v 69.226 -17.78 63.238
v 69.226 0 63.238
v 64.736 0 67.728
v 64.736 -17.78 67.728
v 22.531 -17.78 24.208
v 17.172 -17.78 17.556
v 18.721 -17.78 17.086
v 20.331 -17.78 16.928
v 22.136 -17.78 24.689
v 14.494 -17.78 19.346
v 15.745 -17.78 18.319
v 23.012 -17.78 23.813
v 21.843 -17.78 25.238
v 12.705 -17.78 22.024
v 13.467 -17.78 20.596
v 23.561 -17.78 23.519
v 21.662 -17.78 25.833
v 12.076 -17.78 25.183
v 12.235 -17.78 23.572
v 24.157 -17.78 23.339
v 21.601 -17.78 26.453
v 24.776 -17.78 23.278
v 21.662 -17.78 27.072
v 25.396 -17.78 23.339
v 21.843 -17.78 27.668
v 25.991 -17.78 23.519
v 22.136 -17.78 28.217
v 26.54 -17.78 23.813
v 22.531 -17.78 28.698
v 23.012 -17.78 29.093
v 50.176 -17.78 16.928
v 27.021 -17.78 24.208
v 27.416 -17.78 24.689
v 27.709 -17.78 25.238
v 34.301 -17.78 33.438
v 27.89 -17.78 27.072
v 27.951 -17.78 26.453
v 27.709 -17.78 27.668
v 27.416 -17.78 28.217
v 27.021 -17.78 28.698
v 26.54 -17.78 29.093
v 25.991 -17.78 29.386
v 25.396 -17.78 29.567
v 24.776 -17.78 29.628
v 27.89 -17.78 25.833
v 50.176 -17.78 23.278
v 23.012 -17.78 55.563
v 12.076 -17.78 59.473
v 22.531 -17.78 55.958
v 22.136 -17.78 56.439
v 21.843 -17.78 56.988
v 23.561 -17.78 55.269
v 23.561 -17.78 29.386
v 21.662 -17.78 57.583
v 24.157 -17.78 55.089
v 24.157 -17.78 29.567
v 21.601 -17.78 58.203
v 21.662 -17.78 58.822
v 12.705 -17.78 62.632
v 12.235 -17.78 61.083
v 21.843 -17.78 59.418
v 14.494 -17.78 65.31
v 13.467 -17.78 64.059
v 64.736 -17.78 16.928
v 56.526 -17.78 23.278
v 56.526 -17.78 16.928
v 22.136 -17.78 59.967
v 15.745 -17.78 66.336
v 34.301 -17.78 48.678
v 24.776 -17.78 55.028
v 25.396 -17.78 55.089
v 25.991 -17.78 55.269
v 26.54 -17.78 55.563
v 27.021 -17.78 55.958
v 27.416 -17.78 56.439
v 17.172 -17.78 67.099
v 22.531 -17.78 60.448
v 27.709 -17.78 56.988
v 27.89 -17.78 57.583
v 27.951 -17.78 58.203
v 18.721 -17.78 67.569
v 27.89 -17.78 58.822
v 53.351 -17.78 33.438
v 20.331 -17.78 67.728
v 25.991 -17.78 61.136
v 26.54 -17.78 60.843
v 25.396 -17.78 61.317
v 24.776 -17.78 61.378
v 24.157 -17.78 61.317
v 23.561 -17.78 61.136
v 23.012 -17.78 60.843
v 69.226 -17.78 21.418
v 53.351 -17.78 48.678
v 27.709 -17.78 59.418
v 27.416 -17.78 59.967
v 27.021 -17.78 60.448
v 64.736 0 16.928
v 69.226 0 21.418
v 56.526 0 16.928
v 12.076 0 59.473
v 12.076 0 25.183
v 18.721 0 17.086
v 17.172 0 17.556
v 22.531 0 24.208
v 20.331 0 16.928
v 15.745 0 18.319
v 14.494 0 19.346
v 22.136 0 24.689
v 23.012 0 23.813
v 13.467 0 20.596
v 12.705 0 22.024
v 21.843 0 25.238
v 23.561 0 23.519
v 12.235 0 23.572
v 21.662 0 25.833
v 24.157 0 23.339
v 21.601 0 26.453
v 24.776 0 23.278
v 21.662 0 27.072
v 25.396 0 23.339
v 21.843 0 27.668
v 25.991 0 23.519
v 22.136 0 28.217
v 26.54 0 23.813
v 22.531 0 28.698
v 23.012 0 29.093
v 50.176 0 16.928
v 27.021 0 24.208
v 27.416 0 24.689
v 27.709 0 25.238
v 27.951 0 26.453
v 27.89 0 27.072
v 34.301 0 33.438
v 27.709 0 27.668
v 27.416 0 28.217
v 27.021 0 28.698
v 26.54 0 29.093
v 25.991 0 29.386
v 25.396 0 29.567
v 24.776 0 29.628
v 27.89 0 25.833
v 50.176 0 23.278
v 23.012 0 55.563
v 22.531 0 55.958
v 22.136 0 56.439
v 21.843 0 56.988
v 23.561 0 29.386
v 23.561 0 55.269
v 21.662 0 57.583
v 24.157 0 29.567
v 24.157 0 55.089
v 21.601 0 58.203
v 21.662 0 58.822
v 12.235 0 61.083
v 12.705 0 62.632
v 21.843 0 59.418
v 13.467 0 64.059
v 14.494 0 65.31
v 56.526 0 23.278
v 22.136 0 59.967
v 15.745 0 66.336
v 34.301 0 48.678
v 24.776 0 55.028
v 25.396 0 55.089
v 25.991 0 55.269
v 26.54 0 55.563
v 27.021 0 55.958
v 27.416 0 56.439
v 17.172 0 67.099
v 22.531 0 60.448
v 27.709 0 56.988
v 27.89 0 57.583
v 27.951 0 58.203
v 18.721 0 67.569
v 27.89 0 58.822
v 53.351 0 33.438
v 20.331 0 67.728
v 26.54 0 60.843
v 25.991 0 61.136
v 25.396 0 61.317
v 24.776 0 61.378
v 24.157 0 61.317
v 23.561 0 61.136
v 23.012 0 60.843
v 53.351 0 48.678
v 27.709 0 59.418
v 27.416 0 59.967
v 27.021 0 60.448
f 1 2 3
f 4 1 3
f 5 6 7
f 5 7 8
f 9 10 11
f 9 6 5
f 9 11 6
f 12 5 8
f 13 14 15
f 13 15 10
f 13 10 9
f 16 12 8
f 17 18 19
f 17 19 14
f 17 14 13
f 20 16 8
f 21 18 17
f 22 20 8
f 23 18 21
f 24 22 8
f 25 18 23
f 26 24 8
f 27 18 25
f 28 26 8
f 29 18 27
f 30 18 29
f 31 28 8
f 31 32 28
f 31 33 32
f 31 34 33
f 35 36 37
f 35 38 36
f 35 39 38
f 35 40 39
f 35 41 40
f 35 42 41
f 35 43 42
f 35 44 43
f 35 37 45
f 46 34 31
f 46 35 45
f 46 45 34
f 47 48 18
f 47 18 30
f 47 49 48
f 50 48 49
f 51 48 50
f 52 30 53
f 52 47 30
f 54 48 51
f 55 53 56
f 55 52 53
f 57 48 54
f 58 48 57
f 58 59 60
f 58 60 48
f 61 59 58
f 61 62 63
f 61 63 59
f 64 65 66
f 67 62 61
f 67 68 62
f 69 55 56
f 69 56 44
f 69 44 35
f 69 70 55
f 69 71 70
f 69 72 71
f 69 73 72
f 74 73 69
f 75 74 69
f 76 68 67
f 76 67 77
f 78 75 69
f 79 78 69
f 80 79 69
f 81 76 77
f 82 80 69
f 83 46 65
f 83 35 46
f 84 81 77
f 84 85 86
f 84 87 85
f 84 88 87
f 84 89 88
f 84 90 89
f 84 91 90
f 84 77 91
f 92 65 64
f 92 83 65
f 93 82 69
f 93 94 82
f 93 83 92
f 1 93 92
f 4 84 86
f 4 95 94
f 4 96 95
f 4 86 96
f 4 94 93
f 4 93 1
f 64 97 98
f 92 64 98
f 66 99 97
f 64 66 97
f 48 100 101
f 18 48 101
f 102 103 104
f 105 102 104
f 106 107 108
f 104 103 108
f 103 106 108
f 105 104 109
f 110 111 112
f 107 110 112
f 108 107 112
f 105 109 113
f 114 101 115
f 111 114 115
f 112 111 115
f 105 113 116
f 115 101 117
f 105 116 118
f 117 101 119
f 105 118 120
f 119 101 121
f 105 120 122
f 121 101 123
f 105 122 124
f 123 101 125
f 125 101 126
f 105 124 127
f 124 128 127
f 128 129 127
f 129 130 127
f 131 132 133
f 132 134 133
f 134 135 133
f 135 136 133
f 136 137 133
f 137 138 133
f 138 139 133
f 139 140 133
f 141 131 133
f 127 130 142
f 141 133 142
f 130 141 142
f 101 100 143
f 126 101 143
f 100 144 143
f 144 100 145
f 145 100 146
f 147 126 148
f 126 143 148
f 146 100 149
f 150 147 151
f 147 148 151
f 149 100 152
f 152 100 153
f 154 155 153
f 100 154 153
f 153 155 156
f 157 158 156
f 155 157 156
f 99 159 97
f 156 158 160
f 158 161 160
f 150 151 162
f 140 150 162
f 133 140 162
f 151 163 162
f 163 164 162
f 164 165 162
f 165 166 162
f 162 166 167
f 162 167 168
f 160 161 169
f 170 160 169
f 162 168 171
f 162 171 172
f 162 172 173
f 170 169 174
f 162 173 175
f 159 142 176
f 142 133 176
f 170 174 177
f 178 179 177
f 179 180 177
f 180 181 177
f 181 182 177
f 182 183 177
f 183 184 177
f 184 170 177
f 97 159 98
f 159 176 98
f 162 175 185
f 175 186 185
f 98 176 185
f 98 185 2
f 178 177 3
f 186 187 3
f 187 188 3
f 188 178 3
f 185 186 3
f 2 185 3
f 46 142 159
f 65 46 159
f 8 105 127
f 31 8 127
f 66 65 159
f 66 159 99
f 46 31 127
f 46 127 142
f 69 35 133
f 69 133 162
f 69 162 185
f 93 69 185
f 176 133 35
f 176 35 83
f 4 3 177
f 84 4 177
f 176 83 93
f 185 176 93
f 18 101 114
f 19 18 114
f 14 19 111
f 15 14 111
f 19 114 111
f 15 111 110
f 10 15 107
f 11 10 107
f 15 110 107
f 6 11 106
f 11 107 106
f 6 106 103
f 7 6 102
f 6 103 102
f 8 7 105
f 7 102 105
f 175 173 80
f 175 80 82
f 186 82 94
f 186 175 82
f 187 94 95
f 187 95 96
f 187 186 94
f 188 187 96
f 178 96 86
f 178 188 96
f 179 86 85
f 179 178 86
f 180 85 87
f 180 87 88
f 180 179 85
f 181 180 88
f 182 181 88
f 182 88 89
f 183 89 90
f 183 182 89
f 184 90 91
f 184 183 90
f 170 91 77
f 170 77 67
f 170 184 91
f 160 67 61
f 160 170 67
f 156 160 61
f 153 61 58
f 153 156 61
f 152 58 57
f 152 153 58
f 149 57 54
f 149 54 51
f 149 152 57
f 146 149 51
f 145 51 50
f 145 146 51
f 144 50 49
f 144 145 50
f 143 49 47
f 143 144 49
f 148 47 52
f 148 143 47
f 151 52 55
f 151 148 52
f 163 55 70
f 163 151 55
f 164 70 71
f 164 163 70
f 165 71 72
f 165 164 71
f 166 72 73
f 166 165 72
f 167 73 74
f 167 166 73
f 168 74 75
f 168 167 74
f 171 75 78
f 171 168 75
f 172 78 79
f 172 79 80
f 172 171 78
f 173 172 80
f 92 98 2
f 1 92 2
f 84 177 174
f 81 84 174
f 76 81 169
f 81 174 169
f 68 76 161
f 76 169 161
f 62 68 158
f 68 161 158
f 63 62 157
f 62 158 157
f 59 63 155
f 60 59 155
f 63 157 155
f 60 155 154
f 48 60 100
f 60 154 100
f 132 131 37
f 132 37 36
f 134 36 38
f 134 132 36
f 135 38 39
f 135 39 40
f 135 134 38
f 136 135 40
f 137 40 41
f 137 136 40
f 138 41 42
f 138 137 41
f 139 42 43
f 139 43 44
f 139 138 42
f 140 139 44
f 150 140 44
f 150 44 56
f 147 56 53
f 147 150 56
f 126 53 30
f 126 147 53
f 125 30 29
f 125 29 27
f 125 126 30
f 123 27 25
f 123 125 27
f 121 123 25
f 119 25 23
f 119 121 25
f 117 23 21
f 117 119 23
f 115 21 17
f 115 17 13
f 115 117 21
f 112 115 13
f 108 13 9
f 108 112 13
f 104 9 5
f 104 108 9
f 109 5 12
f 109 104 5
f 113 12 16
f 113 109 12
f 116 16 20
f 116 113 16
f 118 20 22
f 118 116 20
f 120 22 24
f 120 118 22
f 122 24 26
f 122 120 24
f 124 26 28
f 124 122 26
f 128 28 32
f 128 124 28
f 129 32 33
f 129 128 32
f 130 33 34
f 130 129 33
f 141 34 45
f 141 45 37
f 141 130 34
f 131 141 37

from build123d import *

# Parameters (mm, degrees)
F0_R     = 3.175
F0_W     = 19.05
F0_H     = 15.24
F1_DEPTH = 17.78


with BuildPart() as f1:
    # F0 (on Front) → F1 (new body)
    with BuildSketch(Plane.XZ):
        with BuildLine():
            Line((12.07617, 59.472699), (12.07617, 58.202699))
            Line((12.07617, 58.202699), (12.07617, 42.327699))
            Line((12.07617, 42.327699), (12.07617, 26.452699))
            Line((12.07617, 26.452699), (12.07617, 25.182699))
            ThreePointArc((12.07617, 25.182699), (14.494003, 19.345532), (20.33117, 16.927699))
            Line((20.33117, 16.927699), (50.17617, 16.927699))
            Line((50.17617, 16.927699), (50.17617, 23.277699))
            Line((50.17617, 23.277699), (56.52617, 23.277699))
            Line((56.52617, 23.277699), (56.52617, 16.927699))
            Line((56.52617, 16.927699), (64.736042, 16.927699))
            Line((64.736042, 16.927699), (69.22617, 21.417827))
            Line((69.22617, 21.417827), (69.22617, 63.237571))
            Line((69.22617, 63.237571), (64.736042, 67.727699))
            Line((64.736042, 67.727699), (20.33117, 67.727699))
            ThreePointArc((20.33117, 67.727699), (14.494003, 65.309865), (12.07617, 59.472699))
        make_face()
        with Locations((24.77617, 26.452699)):
            Circle(F0_R, mode=Mode.SUBTRACT)
        with Locations((43.82617, 41.057699)):
            Rectangle(F0_W, F0_H, mode=Mode.SUBTRACT)
        with Locations((24.77617, 58.202699)):
            Circle(F0_R, mode=Mode.SUBTRACT)
    extrude(amount=F1_DEPTH)


solid = f1.part
